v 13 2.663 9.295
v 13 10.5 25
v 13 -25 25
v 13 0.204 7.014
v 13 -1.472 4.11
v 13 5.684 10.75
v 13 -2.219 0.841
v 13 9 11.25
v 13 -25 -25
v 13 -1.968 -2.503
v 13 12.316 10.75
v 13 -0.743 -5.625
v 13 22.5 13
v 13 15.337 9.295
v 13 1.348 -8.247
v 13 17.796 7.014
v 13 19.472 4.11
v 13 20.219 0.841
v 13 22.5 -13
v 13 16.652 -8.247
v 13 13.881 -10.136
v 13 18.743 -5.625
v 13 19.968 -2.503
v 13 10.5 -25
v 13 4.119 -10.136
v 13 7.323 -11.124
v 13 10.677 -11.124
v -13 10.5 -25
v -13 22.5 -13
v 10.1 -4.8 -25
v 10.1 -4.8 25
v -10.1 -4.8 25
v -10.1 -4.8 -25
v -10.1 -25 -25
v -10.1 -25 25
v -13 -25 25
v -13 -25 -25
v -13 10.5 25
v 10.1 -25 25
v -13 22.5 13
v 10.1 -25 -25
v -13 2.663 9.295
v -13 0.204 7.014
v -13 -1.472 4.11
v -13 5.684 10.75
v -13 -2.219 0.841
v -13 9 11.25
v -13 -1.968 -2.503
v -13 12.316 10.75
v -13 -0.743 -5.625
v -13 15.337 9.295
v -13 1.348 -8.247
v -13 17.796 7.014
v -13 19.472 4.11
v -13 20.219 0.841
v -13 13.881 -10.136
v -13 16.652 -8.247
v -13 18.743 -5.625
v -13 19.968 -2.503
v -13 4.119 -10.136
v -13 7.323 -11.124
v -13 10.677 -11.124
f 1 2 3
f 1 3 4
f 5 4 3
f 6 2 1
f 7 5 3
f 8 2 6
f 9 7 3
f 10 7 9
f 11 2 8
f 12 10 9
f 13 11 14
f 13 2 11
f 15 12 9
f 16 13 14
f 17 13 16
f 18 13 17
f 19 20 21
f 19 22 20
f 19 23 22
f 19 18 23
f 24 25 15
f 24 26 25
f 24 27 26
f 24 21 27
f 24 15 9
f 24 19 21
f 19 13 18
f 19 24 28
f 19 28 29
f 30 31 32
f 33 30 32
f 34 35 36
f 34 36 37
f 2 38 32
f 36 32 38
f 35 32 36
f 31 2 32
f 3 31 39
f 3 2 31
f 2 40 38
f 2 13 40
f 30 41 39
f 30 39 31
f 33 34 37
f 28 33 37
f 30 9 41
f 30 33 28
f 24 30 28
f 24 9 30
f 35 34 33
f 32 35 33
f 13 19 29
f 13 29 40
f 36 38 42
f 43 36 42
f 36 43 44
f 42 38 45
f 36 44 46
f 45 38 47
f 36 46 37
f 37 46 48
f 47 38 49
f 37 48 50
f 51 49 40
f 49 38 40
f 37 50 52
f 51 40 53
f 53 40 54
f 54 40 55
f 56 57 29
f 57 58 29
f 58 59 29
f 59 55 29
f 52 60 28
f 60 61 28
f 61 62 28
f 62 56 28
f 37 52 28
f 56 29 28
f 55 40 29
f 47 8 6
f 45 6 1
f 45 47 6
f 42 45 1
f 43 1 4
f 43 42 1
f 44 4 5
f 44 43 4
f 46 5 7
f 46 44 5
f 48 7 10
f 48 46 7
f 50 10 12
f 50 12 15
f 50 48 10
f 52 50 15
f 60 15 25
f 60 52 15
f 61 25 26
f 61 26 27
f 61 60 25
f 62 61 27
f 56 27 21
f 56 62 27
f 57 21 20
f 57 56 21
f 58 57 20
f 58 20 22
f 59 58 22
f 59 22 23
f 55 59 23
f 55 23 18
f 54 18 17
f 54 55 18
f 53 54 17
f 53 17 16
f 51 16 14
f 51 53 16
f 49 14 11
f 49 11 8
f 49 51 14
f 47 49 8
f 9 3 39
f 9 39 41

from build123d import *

# Parameters (mm, degrees)
SKETCH_1_R          = 11.25
EXTRUDE_1_DEPTH     = 13
SKETCH_2_W          = 20.2
SKETCH_2_H          = 20.2
CUT_EXTRUDE_1_DEPTH = 58.393379409


with BuildPart() as part:
    # Эскиз1 → Бобышка-Вытянуть1 (new, symmetric)
    with BuildSketch(Plane(origin=(0, 0, 0), x_dir=(0, 0, -1), z_dir=(1, 0, 0))):
        Polygon((-25, -25), (25, -25), (25, 10.5), (13, 22.5), (-13, 22.5), (-25, 10.5), align=None)
        with Locations(Location((0, 9, 0), (0, 0, 180))):
            Circle(SKETCH_1_R, mode=Mode.SUBTRACT)
    extrude(amount=EXTRUDE_1_DEPTH, both=True)

    # Эскиз2 → Вырез-Вытянуть1 (cut, through all)
    with BuildSketch(Plane(origin=(0, 0, -25), x_dir=(-1, 0, 0), z_dir=(0, 0, -1))):
        with Locations((0, -14.9)):
            Rectangle(SKETCH_2_W, SKETCH_2_H)
    extrude(amount=-CUT_EXTRUDE_1_DEPTH, mode=Mode.SUBTRACT)


solid = part.part
